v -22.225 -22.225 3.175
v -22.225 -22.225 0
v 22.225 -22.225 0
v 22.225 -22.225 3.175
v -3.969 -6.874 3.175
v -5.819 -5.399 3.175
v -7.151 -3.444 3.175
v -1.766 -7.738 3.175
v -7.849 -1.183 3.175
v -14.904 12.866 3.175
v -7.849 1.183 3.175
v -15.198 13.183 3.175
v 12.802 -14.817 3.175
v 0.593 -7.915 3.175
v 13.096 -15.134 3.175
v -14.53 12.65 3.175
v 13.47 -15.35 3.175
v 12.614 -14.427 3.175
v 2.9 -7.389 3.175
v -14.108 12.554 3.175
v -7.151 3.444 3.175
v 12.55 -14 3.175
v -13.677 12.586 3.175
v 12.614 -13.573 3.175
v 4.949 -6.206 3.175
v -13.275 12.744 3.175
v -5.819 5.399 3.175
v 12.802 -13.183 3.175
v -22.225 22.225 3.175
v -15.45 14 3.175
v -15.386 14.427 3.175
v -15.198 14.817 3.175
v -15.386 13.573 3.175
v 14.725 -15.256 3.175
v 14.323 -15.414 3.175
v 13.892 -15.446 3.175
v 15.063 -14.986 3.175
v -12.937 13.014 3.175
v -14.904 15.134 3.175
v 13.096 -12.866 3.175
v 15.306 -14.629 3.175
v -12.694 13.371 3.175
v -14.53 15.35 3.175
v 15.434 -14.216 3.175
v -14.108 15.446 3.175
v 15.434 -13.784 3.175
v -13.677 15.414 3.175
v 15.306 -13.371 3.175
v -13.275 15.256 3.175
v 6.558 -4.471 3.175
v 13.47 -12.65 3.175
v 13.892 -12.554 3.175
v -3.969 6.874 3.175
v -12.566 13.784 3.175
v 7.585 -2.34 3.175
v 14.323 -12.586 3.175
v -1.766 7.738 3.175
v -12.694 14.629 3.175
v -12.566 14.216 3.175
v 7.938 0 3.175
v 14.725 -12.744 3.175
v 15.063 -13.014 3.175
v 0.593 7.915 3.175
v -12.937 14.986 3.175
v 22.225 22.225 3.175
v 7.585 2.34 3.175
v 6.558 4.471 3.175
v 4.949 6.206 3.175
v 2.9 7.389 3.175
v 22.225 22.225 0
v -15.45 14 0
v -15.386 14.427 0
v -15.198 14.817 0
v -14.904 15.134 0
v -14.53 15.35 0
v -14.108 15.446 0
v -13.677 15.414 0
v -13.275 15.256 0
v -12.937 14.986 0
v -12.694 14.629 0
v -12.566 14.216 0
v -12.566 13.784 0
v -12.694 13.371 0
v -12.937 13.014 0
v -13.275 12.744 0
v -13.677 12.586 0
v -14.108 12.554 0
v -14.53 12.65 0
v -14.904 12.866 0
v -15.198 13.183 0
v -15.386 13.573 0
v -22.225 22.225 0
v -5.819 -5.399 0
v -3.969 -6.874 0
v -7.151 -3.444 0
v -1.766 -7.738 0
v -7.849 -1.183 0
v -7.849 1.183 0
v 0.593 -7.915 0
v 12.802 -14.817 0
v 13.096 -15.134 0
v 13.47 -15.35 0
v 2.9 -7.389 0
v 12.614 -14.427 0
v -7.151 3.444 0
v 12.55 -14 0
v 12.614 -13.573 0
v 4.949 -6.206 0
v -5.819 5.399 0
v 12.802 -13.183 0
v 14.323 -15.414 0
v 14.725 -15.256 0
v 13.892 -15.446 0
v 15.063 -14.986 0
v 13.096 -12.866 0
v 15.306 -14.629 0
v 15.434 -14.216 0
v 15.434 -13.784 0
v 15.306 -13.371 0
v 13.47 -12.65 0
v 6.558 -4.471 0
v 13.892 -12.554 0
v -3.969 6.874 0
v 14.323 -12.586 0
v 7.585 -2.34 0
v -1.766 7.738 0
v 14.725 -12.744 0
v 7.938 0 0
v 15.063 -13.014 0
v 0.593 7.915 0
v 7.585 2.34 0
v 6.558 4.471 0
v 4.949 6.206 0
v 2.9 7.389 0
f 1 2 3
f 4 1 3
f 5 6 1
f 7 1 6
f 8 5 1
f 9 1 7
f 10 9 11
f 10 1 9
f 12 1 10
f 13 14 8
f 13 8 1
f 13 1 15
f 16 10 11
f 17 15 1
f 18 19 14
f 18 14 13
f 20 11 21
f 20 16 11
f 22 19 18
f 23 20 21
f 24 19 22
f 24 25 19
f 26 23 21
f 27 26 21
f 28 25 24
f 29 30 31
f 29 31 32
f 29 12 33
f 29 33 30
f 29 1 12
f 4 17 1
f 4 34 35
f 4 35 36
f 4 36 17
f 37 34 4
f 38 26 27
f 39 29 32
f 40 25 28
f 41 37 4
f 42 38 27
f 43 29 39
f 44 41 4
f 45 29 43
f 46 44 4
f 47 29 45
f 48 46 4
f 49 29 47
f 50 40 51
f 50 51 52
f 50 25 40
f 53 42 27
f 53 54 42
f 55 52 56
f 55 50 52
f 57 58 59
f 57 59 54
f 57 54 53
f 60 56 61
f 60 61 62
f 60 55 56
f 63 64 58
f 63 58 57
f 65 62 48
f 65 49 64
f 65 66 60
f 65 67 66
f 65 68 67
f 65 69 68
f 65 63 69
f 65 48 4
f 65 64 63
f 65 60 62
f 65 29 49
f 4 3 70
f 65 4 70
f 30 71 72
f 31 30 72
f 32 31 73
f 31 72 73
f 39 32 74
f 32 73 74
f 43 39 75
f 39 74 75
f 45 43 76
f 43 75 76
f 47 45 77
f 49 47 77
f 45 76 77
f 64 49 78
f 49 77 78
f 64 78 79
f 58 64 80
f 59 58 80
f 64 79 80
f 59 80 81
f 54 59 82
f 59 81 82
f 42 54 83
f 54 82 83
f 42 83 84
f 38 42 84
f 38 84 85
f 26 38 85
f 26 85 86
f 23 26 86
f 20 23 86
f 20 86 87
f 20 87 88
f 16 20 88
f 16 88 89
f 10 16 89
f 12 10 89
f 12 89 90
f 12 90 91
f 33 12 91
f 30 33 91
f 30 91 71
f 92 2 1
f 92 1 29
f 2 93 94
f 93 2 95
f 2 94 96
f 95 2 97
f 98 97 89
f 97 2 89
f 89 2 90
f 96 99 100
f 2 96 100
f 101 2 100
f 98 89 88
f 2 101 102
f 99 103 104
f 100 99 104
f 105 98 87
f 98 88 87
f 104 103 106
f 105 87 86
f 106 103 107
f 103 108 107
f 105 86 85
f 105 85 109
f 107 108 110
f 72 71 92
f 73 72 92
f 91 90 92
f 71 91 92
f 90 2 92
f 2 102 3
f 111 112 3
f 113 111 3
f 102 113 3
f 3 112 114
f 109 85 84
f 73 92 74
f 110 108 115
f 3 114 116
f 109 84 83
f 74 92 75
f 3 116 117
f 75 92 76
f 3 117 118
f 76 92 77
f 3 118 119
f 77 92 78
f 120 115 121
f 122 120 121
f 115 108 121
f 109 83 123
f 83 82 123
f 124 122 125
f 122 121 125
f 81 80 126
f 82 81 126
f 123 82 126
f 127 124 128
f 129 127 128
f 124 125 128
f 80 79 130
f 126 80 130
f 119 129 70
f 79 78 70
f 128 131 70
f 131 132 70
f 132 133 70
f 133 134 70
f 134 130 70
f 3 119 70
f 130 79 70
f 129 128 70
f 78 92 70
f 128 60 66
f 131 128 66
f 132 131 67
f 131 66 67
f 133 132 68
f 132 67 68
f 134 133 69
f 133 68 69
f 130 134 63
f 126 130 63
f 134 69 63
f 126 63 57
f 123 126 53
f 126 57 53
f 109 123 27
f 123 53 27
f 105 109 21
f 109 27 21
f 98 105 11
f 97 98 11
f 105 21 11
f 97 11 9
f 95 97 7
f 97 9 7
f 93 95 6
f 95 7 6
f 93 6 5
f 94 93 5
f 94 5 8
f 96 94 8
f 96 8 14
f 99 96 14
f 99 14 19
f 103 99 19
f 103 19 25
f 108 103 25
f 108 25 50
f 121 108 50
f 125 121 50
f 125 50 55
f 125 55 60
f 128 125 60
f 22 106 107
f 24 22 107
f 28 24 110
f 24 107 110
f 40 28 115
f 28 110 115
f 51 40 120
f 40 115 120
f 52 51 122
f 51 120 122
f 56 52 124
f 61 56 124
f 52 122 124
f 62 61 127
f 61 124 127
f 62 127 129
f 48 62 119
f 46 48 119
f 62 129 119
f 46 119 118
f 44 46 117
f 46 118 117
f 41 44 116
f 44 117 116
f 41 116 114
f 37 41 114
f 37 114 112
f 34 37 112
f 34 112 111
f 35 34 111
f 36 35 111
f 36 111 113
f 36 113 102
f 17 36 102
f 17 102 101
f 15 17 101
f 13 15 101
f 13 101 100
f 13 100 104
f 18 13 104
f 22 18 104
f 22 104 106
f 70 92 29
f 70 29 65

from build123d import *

# Parameters (mm, degrees)
SKETCH1_W              = 44.45
SKETCH1_H              = 44.45
BOSS_EXTRUDE1_DEPTH    = 3.175
M2_5_CLEARANCE_HOLE1_D = 2.9
SKETCH5_R              = 7.9375
CUT_EXTRUDE1_DEPTH     = 4.175


with BuildPart() as part:
    # Sketch1 → Boss-Extrude1 (new body)
    with BuildSketch(Plane.XY):
        Rectangle(SKETCH1_W, SKETCH1_H)
    extrude(amount=BOSS_EXTRUDE1_DEPTH)

    # M2.5 Clearance Hole1 (through all)
    with Locations(Plane.XY.offset(3.175)):
        with Locations((-14, 14), (14, -14)):
            Hole(M2_5_CLEARANCE_HOLE1_D / 2)

    # Sketch5 → Cut-Extrude1 (cut, through all)
    with BuildSketch(Plane.XY.offset(3.175)):
        Circle(SKETCH5_R)
    extrude(amount=-CUT_EXTRUDE1_DEPTH, mode=Mode.SUBTRACT)


solid = part.part
